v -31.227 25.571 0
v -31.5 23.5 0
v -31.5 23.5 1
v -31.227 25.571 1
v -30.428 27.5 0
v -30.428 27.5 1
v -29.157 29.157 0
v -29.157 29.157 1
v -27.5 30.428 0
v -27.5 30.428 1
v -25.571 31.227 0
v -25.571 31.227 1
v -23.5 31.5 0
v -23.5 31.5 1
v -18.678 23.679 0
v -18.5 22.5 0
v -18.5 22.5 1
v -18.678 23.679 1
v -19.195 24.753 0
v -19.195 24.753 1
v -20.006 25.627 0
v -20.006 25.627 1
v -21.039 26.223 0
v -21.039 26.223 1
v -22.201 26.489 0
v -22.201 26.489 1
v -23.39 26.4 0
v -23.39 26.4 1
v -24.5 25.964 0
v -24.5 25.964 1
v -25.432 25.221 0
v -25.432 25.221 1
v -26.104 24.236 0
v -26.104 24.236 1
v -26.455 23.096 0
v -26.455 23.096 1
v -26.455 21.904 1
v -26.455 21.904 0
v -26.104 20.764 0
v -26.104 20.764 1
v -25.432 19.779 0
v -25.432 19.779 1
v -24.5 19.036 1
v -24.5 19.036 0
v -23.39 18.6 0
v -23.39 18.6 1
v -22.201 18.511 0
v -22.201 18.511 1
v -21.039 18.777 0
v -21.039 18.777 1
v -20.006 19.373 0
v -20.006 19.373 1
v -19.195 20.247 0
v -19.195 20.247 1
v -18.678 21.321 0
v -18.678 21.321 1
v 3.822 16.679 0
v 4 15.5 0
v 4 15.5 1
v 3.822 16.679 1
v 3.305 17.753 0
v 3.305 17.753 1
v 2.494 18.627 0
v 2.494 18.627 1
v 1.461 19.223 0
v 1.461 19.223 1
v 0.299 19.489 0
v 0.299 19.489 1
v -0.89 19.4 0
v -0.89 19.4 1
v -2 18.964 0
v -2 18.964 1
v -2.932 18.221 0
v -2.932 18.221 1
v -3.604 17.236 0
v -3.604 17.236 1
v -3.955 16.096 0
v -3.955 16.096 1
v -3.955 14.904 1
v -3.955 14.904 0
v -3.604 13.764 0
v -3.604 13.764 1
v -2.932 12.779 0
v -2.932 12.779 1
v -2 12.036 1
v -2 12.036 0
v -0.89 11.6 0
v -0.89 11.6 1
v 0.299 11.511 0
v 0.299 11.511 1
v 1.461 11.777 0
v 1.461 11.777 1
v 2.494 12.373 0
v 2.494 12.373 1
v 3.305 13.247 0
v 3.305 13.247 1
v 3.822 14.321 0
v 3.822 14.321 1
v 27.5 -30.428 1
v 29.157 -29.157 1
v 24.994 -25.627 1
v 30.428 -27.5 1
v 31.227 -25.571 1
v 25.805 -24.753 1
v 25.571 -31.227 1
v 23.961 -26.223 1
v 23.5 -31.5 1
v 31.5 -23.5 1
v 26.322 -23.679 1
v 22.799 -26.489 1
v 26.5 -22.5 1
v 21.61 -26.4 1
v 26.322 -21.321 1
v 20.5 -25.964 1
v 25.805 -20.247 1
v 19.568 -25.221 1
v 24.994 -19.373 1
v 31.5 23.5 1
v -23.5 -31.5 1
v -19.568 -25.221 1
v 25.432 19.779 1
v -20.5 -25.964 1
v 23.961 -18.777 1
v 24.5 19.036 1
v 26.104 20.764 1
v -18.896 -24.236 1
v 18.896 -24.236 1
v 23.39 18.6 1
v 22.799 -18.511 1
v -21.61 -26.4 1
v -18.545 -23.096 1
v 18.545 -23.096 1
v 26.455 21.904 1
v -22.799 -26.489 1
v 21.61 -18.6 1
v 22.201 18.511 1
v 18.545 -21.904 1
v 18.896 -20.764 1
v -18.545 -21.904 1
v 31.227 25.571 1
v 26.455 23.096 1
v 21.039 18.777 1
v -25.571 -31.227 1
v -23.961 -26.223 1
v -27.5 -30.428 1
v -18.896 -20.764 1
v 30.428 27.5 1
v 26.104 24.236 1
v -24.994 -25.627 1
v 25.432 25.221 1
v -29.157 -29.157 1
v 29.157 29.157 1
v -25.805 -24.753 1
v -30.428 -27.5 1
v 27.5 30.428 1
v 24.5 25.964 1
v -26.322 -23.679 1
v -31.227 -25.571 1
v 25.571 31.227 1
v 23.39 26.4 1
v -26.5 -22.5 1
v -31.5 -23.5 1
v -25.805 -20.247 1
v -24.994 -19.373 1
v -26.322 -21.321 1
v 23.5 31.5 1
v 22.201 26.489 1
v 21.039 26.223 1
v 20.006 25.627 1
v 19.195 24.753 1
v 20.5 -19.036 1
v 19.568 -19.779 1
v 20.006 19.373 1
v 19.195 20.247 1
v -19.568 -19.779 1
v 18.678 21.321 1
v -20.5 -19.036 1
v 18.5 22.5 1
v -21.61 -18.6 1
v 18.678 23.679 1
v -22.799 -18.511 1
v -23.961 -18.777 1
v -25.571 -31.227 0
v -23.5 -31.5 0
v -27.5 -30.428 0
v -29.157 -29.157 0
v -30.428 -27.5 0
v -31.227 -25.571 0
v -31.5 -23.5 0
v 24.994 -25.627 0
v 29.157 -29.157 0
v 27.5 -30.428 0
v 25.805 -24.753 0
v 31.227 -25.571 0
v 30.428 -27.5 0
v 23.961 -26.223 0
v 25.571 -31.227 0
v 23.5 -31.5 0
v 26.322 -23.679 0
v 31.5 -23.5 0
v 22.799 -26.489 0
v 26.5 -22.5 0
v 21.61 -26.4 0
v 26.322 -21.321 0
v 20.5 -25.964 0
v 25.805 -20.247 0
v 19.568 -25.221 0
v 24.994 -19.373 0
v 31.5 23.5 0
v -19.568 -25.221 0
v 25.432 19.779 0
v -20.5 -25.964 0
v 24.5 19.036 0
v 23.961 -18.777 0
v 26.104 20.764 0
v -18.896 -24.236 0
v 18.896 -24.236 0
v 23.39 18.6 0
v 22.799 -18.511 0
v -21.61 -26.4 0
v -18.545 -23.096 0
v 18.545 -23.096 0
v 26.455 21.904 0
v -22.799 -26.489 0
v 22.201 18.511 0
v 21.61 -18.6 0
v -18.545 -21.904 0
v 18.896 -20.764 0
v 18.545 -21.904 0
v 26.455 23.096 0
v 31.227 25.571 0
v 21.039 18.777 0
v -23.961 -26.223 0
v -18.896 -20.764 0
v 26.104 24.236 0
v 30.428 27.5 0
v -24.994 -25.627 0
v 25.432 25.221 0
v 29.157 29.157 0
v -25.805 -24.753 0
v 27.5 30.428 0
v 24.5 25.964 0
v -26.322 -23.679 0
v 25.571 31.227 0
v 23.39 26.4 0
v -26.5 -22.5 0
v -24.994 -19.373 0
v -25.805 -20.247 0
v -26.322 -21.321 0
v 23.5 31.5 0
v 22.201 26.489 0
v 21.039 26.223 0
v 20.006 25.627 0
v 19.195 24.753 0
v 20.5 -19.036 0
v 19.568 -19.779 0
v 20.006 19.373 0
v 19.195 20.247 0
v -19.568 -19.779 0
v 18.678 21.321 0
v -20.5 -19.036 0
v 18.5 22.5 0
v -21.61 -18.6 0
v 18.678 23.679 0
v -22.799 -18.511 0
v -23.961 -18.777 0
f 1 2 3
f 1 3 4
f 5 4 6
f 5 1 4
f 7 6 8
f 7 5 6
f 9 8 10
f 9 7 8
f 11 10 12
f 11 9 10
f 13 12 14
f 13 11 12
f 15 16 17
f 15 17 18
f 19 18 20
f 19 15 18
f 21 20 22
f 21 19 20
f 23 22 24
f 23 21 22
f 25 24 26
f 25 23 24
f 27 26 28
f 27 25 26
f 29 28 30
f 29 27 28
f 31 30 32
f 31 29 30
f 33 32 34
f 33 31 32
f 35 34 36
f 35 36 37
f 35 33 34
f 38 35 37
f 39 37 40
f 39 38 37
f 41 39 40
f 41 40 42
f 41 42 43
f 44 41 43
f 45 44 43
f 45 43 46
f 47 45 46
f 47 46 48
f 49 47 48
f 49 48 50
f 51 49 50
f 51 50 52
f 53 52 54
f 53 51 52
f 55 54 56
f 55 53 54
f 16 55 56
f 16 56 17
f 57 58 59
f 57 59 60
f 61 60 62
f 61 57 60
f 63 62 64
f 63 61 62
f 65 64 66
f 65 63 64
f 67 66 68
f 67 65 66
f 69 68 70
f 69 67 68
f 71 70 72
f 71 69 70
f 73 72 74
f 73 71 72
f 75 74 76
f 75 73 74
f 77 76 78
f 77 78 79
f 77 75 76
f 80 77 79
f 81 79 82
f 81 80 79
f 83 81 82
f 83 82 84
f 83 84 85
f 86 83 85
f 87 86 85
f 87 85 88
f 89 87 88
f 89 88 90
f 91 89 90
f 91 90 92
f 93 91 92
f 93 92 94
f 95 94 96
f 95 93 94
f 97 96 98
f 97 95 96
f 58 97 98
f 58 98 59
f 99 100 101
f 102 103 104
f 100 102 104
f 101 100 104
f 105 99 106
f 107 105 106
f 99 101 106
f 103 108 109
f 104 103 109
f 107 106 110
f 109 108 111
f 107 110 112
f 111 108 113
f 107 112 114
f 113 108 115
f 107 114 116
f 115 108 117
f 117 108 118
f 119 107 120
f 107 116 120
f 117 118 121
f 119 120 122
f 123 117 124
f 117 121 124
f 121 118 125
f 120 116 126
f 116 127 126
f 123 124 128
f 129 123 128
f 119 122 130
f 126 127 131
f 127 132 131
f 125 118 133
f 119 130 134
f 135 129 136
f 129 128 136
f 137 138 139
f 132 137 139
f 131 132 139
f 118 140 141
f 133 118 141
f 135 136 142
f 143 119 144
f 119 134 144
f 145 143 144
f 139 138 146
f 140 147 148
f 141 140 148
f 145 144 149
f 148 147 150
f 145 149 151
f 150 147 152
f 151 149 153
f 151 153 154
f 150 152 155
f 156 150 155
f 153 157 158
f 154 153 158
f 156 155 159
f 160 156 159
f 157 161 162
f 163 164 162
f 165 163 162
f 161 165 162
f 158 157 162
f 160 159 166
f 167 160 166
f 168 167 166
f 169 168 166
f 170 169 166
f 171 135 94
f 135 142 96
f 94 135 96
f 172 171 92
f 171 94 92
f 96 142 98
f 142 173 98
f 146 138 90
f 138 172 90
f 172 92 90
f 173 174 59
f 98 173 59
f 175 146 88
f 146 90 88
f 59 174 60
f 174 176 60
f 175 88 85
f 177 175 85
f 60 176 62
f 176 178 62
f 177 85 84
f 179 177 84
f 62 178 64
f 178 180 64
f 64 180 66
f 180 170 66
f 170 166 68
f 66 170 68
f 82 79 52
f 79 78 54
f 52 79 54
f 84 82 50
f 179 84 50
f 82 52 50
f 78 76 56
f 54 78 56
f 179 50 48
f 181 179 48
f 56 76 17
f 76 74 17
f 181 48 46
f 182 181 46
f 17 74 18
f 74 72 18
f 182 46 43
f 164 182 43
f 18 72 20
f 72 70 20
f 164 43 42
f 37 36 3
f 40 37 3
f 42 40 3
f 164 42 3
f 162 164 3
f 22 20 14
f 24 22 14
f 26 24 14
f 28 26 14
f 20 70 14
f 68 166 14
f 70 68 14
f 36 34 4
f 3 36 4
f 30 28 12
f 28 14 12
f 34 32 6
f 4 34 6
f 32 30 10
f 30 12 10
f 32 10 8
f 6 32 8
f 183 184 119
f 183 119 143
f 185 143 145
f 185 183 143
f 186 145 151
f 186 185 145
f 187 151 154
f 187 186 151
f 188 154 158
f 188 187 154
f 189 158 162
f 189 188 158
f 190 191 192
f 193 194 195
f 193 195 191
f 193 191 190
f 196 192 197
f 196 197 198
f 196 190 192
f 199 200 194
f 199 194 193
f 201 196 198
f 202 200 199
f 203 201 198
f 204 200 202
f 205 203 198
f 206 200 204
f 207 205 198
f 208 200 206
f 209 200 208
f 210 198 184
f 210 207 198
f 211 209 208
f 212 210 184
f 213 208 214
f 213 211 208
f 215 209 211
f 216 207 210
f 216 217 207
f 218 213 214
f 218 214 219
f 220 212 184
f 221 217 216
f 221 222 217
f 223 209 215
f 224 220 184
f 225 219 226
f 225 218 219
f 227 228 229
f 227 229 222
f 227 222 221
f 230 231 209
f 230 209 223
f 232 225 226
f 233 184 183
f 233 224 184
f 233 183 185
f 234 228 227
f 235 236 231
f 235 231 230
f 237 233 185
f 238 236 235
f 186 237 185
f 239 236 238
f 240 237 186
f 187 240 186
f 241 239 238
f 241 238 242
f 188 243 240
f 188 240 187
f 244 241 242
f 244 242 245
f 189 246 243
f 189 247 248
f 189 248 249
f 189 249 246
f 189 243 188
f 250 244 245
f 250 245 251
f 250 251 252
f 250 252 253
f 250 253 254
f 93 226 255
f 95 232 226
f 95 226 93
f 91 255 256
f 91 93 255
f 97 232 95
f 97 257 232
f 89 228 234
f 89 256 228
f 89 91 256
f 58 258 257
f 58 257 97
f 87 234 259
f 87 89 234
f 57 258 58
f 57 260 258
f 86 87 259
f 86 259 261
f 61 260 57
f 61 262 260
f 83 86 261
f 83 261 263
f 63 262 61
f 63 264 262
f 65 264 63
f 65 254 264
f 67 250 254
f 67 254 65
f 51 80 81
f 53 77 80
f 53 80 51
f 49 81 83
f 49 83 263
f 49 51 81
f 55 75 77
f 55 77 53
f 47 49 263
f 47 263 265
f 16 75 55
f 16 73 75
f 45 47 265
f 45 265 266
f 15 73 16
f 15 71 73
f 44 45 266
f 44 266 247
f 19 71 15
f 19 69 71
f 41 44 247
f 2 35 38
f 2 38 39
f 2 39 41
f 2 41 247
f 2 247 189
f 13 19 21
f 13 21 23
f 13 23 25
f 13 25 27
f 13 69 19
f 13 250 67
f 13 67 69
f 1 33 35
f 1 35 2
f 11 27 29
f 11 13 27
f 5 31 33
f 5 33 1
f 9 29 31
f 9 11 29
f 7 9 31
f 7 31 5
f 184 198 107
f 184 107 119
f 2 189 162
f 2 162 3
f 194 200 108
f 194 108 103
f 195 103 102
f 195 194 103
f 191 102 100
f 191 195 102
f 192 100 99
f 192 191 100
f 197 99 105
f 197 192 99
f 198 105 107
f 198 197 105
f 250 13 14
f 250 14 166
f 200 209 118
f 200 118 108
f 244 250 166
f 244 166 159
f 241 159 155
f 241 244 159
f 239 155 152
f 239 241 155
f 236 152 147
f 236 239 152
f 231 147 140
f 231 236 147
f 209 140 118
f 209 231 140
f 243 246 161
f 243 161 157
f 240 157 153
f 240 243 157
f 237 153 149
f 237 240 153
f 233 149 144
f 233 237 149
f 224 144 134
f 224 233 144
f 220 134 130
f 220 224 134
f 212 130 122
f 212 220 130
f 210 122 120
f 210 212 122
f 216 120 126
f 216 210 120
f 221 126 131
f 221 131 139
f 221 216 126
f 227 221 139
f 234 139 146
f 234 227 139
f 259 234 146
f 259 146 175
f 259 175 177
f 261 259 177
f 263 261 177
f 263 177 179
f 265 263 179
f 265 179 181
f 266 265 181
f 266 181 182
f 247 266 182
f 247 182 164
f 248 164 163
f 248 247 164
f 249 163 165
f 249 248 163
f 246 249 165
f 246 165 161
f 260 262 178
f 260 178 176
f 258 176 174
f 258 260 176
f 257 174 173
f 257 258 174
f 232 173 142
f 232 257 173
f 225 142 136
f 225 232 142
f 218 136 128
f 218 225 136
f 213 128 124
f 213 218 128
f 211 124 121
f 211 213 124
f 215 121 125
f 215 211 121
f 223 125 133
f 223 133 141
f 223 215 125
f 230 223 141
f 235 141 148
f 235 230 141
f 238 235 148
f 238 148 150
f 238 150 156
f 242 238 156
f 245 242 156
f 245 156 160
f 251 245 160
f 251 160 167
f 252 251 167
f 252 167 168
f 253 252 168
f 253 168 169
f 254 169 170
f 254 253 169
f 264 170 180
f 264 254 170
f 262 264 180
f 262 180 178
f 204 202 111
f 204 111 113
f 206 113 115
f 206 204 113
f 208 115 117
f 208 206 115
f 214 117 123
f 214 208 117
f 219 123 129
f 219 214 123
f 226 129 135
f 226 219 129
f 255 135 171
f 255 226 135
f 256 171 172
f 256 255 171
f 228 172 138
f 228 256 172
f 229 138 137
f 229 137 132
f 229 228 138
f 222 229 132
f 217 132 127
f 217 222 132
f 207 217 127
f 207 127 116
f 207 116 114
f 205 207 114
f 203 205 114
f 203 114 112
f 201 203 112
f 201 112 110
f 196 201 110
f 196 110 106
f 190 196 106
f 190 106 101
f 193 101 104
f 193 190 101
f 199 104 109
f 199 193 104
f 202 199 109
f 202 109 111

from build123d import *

# Parameters (mm, degrees)
SKETCH_1_R      = 4
EXTRUDE_1_DEPTH = 1


with BuildPart() as part:
    # 草图1 → 凸台-拉伸1 (new body)
    with BuildSketch(Plane.XY):
        with BuildLine():
            Line((-23.5, 31.5), (23.5, 31.5))
            ThreePointArc((23.5, 31.5), (29.156854249, 29.156854249), (31.5, 23.5))
            Line((31.5, 23.5), (31.5, -23.5))
            ThreePointArc((31.5, -23.5), (29.156854249, -29.156854249), (23.5, -31.5))
            Line((23.5, -31.5), (-23.5, -31.5))
            ThreePointArc((-23.5, -31.5), (-29.156854249, -29.156854249), (-31.5, -23.5))
            Line((-31.5, -23.5), (-31.5, 23.5))
            ThreePointArc((-31.5, 23.5), (-29.156854249, 29.156854249), (-23.5, 31.5))
        make_face()
        with Locations((-22.5, 22.5)):
            Circle(SKETCH_1_R, mode=Mode.SUBTRACT)
        with Locations(Location((22.5, 22.5, 0), (0, 0, 180))):
            Circle(SKETCH_1_R, mode=Mode.SUBTRACT)
        with Locations((22.5, -22.5)):
            Circle(SKETCH_1_R, mode=Mode.SUBTRACT)
        with Locations(Location((-22.5, -22.5, 0), (0, 0, 180))):
            Circle(SKETCH_1_R, mode=Mode.SUBTRACT)
        with Locations((0, 15.5)):
            Circle(SKETCH_1_R, mode=Mode.SUBTRACT)
    extrude(amount=EXTRUDE_1_DEPTH)


solid = part.part
